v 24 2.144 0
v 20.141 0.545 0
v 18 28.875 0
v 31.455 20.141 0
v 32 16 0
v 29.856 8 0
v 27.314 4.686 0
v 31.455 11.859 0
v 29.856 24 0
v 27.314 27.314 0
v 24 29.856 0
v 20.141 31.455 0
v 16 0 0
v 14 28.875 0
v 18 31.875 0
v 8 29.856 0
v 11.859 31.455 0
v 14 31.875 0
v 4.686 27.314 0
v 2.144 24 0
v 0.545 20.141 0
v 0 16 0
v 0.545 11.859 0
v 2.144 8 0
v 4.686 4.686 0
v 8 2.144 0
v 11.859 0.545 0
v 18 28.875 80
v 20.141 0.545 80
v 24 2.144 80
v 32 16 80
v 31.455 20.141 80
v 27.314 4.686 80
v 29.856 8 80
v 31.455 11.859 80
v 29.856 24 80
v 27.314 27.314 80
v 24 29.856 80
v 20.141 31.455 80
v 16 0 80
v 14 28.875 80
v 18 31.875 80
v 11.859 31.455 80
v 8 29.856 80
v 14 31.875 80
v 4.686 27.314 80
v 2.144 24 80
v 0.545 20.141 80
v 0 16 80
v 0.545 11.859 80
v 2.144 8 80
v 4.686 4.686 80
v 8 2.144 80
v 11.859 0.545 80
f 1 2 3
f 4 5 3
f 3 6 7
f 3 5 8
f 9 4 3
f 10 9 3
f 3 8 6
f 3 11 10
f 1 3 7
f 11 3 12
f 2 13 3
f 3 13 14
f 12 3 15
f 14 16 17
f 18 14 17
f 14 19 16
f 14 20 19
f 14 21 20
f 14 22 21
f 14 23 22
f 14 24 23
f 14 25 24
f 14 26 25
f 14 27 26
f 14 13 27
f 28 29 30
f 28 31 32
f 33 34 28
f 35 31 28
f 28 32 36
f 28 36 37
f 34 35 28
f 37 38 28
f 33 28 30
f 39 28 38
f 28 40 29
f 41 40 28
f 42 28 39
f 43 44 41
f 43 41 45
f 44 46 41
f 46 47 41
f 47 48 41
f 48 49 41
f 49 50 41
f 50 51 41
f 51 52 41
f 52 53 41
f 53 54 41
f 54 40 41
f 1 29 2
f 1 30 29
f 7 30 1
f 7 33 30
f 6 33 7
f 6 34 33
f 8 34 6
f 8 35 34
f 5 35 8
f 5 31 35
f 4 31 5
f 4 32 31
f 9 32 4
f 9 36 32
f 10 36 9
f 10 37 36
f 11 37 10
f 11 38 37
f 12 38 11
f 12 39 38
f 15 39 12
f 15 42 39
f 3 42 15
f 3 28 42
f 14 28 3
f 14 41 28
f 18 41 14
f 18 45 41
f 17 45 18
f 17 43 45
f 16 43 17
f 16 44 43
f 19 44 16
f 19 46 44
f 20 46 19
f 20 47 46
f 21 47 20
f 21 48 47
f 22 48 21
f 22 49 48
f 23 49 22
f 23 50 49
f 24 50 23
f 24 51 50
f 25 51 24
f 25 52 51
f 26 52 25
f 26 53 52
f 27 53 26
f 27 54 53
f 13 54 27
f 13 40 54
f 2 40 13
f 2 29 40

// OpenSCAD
$fn = 32;

// ----------------------------------------------------------------------
// Keyway shaft: d32 shaft, key 4 x 3 mm
// ----------------------------------------------------------------------

// --- parameters (mm) ---
shaft_r = 16;             // shaft radius
key_w = 4;                // keyway width
key_d = 3;                // keyway depth below the surface line
plate_t = 80;             // shaft length, Z (extrusion height)

shaft_d = 2 * shaft_r;  // shaft diameter
circle_step = 15;  // polygon sampling step, degrees

profile = [[11.859, 31.455], [8, 29.856], [4.686, 27.314], [2.144, 24], [0.545, 20.141], [0, 16], [0.545, 11.859], [2.144, 8], [4.686, 4.686], [8, 2.144], [11.859, 0.545], [16, 0], [20.141, 0.545], [24, 2.144], [27.314, 4.686], [29.856, 8], [31.455, 11.859], [32, 16], [31.455, 20.141], [29.856, 24], [27.314, 27.314], [24, 29.856], [20.141, 31.455], [18, 31.875], [18, 28.875], [14, 28.875], [14, 31.875]];  // primary outline, 27 points, counter clockwise

// --- the one profile operation ---
linear_extrude(height = plate_t) polygon(points = profile);
